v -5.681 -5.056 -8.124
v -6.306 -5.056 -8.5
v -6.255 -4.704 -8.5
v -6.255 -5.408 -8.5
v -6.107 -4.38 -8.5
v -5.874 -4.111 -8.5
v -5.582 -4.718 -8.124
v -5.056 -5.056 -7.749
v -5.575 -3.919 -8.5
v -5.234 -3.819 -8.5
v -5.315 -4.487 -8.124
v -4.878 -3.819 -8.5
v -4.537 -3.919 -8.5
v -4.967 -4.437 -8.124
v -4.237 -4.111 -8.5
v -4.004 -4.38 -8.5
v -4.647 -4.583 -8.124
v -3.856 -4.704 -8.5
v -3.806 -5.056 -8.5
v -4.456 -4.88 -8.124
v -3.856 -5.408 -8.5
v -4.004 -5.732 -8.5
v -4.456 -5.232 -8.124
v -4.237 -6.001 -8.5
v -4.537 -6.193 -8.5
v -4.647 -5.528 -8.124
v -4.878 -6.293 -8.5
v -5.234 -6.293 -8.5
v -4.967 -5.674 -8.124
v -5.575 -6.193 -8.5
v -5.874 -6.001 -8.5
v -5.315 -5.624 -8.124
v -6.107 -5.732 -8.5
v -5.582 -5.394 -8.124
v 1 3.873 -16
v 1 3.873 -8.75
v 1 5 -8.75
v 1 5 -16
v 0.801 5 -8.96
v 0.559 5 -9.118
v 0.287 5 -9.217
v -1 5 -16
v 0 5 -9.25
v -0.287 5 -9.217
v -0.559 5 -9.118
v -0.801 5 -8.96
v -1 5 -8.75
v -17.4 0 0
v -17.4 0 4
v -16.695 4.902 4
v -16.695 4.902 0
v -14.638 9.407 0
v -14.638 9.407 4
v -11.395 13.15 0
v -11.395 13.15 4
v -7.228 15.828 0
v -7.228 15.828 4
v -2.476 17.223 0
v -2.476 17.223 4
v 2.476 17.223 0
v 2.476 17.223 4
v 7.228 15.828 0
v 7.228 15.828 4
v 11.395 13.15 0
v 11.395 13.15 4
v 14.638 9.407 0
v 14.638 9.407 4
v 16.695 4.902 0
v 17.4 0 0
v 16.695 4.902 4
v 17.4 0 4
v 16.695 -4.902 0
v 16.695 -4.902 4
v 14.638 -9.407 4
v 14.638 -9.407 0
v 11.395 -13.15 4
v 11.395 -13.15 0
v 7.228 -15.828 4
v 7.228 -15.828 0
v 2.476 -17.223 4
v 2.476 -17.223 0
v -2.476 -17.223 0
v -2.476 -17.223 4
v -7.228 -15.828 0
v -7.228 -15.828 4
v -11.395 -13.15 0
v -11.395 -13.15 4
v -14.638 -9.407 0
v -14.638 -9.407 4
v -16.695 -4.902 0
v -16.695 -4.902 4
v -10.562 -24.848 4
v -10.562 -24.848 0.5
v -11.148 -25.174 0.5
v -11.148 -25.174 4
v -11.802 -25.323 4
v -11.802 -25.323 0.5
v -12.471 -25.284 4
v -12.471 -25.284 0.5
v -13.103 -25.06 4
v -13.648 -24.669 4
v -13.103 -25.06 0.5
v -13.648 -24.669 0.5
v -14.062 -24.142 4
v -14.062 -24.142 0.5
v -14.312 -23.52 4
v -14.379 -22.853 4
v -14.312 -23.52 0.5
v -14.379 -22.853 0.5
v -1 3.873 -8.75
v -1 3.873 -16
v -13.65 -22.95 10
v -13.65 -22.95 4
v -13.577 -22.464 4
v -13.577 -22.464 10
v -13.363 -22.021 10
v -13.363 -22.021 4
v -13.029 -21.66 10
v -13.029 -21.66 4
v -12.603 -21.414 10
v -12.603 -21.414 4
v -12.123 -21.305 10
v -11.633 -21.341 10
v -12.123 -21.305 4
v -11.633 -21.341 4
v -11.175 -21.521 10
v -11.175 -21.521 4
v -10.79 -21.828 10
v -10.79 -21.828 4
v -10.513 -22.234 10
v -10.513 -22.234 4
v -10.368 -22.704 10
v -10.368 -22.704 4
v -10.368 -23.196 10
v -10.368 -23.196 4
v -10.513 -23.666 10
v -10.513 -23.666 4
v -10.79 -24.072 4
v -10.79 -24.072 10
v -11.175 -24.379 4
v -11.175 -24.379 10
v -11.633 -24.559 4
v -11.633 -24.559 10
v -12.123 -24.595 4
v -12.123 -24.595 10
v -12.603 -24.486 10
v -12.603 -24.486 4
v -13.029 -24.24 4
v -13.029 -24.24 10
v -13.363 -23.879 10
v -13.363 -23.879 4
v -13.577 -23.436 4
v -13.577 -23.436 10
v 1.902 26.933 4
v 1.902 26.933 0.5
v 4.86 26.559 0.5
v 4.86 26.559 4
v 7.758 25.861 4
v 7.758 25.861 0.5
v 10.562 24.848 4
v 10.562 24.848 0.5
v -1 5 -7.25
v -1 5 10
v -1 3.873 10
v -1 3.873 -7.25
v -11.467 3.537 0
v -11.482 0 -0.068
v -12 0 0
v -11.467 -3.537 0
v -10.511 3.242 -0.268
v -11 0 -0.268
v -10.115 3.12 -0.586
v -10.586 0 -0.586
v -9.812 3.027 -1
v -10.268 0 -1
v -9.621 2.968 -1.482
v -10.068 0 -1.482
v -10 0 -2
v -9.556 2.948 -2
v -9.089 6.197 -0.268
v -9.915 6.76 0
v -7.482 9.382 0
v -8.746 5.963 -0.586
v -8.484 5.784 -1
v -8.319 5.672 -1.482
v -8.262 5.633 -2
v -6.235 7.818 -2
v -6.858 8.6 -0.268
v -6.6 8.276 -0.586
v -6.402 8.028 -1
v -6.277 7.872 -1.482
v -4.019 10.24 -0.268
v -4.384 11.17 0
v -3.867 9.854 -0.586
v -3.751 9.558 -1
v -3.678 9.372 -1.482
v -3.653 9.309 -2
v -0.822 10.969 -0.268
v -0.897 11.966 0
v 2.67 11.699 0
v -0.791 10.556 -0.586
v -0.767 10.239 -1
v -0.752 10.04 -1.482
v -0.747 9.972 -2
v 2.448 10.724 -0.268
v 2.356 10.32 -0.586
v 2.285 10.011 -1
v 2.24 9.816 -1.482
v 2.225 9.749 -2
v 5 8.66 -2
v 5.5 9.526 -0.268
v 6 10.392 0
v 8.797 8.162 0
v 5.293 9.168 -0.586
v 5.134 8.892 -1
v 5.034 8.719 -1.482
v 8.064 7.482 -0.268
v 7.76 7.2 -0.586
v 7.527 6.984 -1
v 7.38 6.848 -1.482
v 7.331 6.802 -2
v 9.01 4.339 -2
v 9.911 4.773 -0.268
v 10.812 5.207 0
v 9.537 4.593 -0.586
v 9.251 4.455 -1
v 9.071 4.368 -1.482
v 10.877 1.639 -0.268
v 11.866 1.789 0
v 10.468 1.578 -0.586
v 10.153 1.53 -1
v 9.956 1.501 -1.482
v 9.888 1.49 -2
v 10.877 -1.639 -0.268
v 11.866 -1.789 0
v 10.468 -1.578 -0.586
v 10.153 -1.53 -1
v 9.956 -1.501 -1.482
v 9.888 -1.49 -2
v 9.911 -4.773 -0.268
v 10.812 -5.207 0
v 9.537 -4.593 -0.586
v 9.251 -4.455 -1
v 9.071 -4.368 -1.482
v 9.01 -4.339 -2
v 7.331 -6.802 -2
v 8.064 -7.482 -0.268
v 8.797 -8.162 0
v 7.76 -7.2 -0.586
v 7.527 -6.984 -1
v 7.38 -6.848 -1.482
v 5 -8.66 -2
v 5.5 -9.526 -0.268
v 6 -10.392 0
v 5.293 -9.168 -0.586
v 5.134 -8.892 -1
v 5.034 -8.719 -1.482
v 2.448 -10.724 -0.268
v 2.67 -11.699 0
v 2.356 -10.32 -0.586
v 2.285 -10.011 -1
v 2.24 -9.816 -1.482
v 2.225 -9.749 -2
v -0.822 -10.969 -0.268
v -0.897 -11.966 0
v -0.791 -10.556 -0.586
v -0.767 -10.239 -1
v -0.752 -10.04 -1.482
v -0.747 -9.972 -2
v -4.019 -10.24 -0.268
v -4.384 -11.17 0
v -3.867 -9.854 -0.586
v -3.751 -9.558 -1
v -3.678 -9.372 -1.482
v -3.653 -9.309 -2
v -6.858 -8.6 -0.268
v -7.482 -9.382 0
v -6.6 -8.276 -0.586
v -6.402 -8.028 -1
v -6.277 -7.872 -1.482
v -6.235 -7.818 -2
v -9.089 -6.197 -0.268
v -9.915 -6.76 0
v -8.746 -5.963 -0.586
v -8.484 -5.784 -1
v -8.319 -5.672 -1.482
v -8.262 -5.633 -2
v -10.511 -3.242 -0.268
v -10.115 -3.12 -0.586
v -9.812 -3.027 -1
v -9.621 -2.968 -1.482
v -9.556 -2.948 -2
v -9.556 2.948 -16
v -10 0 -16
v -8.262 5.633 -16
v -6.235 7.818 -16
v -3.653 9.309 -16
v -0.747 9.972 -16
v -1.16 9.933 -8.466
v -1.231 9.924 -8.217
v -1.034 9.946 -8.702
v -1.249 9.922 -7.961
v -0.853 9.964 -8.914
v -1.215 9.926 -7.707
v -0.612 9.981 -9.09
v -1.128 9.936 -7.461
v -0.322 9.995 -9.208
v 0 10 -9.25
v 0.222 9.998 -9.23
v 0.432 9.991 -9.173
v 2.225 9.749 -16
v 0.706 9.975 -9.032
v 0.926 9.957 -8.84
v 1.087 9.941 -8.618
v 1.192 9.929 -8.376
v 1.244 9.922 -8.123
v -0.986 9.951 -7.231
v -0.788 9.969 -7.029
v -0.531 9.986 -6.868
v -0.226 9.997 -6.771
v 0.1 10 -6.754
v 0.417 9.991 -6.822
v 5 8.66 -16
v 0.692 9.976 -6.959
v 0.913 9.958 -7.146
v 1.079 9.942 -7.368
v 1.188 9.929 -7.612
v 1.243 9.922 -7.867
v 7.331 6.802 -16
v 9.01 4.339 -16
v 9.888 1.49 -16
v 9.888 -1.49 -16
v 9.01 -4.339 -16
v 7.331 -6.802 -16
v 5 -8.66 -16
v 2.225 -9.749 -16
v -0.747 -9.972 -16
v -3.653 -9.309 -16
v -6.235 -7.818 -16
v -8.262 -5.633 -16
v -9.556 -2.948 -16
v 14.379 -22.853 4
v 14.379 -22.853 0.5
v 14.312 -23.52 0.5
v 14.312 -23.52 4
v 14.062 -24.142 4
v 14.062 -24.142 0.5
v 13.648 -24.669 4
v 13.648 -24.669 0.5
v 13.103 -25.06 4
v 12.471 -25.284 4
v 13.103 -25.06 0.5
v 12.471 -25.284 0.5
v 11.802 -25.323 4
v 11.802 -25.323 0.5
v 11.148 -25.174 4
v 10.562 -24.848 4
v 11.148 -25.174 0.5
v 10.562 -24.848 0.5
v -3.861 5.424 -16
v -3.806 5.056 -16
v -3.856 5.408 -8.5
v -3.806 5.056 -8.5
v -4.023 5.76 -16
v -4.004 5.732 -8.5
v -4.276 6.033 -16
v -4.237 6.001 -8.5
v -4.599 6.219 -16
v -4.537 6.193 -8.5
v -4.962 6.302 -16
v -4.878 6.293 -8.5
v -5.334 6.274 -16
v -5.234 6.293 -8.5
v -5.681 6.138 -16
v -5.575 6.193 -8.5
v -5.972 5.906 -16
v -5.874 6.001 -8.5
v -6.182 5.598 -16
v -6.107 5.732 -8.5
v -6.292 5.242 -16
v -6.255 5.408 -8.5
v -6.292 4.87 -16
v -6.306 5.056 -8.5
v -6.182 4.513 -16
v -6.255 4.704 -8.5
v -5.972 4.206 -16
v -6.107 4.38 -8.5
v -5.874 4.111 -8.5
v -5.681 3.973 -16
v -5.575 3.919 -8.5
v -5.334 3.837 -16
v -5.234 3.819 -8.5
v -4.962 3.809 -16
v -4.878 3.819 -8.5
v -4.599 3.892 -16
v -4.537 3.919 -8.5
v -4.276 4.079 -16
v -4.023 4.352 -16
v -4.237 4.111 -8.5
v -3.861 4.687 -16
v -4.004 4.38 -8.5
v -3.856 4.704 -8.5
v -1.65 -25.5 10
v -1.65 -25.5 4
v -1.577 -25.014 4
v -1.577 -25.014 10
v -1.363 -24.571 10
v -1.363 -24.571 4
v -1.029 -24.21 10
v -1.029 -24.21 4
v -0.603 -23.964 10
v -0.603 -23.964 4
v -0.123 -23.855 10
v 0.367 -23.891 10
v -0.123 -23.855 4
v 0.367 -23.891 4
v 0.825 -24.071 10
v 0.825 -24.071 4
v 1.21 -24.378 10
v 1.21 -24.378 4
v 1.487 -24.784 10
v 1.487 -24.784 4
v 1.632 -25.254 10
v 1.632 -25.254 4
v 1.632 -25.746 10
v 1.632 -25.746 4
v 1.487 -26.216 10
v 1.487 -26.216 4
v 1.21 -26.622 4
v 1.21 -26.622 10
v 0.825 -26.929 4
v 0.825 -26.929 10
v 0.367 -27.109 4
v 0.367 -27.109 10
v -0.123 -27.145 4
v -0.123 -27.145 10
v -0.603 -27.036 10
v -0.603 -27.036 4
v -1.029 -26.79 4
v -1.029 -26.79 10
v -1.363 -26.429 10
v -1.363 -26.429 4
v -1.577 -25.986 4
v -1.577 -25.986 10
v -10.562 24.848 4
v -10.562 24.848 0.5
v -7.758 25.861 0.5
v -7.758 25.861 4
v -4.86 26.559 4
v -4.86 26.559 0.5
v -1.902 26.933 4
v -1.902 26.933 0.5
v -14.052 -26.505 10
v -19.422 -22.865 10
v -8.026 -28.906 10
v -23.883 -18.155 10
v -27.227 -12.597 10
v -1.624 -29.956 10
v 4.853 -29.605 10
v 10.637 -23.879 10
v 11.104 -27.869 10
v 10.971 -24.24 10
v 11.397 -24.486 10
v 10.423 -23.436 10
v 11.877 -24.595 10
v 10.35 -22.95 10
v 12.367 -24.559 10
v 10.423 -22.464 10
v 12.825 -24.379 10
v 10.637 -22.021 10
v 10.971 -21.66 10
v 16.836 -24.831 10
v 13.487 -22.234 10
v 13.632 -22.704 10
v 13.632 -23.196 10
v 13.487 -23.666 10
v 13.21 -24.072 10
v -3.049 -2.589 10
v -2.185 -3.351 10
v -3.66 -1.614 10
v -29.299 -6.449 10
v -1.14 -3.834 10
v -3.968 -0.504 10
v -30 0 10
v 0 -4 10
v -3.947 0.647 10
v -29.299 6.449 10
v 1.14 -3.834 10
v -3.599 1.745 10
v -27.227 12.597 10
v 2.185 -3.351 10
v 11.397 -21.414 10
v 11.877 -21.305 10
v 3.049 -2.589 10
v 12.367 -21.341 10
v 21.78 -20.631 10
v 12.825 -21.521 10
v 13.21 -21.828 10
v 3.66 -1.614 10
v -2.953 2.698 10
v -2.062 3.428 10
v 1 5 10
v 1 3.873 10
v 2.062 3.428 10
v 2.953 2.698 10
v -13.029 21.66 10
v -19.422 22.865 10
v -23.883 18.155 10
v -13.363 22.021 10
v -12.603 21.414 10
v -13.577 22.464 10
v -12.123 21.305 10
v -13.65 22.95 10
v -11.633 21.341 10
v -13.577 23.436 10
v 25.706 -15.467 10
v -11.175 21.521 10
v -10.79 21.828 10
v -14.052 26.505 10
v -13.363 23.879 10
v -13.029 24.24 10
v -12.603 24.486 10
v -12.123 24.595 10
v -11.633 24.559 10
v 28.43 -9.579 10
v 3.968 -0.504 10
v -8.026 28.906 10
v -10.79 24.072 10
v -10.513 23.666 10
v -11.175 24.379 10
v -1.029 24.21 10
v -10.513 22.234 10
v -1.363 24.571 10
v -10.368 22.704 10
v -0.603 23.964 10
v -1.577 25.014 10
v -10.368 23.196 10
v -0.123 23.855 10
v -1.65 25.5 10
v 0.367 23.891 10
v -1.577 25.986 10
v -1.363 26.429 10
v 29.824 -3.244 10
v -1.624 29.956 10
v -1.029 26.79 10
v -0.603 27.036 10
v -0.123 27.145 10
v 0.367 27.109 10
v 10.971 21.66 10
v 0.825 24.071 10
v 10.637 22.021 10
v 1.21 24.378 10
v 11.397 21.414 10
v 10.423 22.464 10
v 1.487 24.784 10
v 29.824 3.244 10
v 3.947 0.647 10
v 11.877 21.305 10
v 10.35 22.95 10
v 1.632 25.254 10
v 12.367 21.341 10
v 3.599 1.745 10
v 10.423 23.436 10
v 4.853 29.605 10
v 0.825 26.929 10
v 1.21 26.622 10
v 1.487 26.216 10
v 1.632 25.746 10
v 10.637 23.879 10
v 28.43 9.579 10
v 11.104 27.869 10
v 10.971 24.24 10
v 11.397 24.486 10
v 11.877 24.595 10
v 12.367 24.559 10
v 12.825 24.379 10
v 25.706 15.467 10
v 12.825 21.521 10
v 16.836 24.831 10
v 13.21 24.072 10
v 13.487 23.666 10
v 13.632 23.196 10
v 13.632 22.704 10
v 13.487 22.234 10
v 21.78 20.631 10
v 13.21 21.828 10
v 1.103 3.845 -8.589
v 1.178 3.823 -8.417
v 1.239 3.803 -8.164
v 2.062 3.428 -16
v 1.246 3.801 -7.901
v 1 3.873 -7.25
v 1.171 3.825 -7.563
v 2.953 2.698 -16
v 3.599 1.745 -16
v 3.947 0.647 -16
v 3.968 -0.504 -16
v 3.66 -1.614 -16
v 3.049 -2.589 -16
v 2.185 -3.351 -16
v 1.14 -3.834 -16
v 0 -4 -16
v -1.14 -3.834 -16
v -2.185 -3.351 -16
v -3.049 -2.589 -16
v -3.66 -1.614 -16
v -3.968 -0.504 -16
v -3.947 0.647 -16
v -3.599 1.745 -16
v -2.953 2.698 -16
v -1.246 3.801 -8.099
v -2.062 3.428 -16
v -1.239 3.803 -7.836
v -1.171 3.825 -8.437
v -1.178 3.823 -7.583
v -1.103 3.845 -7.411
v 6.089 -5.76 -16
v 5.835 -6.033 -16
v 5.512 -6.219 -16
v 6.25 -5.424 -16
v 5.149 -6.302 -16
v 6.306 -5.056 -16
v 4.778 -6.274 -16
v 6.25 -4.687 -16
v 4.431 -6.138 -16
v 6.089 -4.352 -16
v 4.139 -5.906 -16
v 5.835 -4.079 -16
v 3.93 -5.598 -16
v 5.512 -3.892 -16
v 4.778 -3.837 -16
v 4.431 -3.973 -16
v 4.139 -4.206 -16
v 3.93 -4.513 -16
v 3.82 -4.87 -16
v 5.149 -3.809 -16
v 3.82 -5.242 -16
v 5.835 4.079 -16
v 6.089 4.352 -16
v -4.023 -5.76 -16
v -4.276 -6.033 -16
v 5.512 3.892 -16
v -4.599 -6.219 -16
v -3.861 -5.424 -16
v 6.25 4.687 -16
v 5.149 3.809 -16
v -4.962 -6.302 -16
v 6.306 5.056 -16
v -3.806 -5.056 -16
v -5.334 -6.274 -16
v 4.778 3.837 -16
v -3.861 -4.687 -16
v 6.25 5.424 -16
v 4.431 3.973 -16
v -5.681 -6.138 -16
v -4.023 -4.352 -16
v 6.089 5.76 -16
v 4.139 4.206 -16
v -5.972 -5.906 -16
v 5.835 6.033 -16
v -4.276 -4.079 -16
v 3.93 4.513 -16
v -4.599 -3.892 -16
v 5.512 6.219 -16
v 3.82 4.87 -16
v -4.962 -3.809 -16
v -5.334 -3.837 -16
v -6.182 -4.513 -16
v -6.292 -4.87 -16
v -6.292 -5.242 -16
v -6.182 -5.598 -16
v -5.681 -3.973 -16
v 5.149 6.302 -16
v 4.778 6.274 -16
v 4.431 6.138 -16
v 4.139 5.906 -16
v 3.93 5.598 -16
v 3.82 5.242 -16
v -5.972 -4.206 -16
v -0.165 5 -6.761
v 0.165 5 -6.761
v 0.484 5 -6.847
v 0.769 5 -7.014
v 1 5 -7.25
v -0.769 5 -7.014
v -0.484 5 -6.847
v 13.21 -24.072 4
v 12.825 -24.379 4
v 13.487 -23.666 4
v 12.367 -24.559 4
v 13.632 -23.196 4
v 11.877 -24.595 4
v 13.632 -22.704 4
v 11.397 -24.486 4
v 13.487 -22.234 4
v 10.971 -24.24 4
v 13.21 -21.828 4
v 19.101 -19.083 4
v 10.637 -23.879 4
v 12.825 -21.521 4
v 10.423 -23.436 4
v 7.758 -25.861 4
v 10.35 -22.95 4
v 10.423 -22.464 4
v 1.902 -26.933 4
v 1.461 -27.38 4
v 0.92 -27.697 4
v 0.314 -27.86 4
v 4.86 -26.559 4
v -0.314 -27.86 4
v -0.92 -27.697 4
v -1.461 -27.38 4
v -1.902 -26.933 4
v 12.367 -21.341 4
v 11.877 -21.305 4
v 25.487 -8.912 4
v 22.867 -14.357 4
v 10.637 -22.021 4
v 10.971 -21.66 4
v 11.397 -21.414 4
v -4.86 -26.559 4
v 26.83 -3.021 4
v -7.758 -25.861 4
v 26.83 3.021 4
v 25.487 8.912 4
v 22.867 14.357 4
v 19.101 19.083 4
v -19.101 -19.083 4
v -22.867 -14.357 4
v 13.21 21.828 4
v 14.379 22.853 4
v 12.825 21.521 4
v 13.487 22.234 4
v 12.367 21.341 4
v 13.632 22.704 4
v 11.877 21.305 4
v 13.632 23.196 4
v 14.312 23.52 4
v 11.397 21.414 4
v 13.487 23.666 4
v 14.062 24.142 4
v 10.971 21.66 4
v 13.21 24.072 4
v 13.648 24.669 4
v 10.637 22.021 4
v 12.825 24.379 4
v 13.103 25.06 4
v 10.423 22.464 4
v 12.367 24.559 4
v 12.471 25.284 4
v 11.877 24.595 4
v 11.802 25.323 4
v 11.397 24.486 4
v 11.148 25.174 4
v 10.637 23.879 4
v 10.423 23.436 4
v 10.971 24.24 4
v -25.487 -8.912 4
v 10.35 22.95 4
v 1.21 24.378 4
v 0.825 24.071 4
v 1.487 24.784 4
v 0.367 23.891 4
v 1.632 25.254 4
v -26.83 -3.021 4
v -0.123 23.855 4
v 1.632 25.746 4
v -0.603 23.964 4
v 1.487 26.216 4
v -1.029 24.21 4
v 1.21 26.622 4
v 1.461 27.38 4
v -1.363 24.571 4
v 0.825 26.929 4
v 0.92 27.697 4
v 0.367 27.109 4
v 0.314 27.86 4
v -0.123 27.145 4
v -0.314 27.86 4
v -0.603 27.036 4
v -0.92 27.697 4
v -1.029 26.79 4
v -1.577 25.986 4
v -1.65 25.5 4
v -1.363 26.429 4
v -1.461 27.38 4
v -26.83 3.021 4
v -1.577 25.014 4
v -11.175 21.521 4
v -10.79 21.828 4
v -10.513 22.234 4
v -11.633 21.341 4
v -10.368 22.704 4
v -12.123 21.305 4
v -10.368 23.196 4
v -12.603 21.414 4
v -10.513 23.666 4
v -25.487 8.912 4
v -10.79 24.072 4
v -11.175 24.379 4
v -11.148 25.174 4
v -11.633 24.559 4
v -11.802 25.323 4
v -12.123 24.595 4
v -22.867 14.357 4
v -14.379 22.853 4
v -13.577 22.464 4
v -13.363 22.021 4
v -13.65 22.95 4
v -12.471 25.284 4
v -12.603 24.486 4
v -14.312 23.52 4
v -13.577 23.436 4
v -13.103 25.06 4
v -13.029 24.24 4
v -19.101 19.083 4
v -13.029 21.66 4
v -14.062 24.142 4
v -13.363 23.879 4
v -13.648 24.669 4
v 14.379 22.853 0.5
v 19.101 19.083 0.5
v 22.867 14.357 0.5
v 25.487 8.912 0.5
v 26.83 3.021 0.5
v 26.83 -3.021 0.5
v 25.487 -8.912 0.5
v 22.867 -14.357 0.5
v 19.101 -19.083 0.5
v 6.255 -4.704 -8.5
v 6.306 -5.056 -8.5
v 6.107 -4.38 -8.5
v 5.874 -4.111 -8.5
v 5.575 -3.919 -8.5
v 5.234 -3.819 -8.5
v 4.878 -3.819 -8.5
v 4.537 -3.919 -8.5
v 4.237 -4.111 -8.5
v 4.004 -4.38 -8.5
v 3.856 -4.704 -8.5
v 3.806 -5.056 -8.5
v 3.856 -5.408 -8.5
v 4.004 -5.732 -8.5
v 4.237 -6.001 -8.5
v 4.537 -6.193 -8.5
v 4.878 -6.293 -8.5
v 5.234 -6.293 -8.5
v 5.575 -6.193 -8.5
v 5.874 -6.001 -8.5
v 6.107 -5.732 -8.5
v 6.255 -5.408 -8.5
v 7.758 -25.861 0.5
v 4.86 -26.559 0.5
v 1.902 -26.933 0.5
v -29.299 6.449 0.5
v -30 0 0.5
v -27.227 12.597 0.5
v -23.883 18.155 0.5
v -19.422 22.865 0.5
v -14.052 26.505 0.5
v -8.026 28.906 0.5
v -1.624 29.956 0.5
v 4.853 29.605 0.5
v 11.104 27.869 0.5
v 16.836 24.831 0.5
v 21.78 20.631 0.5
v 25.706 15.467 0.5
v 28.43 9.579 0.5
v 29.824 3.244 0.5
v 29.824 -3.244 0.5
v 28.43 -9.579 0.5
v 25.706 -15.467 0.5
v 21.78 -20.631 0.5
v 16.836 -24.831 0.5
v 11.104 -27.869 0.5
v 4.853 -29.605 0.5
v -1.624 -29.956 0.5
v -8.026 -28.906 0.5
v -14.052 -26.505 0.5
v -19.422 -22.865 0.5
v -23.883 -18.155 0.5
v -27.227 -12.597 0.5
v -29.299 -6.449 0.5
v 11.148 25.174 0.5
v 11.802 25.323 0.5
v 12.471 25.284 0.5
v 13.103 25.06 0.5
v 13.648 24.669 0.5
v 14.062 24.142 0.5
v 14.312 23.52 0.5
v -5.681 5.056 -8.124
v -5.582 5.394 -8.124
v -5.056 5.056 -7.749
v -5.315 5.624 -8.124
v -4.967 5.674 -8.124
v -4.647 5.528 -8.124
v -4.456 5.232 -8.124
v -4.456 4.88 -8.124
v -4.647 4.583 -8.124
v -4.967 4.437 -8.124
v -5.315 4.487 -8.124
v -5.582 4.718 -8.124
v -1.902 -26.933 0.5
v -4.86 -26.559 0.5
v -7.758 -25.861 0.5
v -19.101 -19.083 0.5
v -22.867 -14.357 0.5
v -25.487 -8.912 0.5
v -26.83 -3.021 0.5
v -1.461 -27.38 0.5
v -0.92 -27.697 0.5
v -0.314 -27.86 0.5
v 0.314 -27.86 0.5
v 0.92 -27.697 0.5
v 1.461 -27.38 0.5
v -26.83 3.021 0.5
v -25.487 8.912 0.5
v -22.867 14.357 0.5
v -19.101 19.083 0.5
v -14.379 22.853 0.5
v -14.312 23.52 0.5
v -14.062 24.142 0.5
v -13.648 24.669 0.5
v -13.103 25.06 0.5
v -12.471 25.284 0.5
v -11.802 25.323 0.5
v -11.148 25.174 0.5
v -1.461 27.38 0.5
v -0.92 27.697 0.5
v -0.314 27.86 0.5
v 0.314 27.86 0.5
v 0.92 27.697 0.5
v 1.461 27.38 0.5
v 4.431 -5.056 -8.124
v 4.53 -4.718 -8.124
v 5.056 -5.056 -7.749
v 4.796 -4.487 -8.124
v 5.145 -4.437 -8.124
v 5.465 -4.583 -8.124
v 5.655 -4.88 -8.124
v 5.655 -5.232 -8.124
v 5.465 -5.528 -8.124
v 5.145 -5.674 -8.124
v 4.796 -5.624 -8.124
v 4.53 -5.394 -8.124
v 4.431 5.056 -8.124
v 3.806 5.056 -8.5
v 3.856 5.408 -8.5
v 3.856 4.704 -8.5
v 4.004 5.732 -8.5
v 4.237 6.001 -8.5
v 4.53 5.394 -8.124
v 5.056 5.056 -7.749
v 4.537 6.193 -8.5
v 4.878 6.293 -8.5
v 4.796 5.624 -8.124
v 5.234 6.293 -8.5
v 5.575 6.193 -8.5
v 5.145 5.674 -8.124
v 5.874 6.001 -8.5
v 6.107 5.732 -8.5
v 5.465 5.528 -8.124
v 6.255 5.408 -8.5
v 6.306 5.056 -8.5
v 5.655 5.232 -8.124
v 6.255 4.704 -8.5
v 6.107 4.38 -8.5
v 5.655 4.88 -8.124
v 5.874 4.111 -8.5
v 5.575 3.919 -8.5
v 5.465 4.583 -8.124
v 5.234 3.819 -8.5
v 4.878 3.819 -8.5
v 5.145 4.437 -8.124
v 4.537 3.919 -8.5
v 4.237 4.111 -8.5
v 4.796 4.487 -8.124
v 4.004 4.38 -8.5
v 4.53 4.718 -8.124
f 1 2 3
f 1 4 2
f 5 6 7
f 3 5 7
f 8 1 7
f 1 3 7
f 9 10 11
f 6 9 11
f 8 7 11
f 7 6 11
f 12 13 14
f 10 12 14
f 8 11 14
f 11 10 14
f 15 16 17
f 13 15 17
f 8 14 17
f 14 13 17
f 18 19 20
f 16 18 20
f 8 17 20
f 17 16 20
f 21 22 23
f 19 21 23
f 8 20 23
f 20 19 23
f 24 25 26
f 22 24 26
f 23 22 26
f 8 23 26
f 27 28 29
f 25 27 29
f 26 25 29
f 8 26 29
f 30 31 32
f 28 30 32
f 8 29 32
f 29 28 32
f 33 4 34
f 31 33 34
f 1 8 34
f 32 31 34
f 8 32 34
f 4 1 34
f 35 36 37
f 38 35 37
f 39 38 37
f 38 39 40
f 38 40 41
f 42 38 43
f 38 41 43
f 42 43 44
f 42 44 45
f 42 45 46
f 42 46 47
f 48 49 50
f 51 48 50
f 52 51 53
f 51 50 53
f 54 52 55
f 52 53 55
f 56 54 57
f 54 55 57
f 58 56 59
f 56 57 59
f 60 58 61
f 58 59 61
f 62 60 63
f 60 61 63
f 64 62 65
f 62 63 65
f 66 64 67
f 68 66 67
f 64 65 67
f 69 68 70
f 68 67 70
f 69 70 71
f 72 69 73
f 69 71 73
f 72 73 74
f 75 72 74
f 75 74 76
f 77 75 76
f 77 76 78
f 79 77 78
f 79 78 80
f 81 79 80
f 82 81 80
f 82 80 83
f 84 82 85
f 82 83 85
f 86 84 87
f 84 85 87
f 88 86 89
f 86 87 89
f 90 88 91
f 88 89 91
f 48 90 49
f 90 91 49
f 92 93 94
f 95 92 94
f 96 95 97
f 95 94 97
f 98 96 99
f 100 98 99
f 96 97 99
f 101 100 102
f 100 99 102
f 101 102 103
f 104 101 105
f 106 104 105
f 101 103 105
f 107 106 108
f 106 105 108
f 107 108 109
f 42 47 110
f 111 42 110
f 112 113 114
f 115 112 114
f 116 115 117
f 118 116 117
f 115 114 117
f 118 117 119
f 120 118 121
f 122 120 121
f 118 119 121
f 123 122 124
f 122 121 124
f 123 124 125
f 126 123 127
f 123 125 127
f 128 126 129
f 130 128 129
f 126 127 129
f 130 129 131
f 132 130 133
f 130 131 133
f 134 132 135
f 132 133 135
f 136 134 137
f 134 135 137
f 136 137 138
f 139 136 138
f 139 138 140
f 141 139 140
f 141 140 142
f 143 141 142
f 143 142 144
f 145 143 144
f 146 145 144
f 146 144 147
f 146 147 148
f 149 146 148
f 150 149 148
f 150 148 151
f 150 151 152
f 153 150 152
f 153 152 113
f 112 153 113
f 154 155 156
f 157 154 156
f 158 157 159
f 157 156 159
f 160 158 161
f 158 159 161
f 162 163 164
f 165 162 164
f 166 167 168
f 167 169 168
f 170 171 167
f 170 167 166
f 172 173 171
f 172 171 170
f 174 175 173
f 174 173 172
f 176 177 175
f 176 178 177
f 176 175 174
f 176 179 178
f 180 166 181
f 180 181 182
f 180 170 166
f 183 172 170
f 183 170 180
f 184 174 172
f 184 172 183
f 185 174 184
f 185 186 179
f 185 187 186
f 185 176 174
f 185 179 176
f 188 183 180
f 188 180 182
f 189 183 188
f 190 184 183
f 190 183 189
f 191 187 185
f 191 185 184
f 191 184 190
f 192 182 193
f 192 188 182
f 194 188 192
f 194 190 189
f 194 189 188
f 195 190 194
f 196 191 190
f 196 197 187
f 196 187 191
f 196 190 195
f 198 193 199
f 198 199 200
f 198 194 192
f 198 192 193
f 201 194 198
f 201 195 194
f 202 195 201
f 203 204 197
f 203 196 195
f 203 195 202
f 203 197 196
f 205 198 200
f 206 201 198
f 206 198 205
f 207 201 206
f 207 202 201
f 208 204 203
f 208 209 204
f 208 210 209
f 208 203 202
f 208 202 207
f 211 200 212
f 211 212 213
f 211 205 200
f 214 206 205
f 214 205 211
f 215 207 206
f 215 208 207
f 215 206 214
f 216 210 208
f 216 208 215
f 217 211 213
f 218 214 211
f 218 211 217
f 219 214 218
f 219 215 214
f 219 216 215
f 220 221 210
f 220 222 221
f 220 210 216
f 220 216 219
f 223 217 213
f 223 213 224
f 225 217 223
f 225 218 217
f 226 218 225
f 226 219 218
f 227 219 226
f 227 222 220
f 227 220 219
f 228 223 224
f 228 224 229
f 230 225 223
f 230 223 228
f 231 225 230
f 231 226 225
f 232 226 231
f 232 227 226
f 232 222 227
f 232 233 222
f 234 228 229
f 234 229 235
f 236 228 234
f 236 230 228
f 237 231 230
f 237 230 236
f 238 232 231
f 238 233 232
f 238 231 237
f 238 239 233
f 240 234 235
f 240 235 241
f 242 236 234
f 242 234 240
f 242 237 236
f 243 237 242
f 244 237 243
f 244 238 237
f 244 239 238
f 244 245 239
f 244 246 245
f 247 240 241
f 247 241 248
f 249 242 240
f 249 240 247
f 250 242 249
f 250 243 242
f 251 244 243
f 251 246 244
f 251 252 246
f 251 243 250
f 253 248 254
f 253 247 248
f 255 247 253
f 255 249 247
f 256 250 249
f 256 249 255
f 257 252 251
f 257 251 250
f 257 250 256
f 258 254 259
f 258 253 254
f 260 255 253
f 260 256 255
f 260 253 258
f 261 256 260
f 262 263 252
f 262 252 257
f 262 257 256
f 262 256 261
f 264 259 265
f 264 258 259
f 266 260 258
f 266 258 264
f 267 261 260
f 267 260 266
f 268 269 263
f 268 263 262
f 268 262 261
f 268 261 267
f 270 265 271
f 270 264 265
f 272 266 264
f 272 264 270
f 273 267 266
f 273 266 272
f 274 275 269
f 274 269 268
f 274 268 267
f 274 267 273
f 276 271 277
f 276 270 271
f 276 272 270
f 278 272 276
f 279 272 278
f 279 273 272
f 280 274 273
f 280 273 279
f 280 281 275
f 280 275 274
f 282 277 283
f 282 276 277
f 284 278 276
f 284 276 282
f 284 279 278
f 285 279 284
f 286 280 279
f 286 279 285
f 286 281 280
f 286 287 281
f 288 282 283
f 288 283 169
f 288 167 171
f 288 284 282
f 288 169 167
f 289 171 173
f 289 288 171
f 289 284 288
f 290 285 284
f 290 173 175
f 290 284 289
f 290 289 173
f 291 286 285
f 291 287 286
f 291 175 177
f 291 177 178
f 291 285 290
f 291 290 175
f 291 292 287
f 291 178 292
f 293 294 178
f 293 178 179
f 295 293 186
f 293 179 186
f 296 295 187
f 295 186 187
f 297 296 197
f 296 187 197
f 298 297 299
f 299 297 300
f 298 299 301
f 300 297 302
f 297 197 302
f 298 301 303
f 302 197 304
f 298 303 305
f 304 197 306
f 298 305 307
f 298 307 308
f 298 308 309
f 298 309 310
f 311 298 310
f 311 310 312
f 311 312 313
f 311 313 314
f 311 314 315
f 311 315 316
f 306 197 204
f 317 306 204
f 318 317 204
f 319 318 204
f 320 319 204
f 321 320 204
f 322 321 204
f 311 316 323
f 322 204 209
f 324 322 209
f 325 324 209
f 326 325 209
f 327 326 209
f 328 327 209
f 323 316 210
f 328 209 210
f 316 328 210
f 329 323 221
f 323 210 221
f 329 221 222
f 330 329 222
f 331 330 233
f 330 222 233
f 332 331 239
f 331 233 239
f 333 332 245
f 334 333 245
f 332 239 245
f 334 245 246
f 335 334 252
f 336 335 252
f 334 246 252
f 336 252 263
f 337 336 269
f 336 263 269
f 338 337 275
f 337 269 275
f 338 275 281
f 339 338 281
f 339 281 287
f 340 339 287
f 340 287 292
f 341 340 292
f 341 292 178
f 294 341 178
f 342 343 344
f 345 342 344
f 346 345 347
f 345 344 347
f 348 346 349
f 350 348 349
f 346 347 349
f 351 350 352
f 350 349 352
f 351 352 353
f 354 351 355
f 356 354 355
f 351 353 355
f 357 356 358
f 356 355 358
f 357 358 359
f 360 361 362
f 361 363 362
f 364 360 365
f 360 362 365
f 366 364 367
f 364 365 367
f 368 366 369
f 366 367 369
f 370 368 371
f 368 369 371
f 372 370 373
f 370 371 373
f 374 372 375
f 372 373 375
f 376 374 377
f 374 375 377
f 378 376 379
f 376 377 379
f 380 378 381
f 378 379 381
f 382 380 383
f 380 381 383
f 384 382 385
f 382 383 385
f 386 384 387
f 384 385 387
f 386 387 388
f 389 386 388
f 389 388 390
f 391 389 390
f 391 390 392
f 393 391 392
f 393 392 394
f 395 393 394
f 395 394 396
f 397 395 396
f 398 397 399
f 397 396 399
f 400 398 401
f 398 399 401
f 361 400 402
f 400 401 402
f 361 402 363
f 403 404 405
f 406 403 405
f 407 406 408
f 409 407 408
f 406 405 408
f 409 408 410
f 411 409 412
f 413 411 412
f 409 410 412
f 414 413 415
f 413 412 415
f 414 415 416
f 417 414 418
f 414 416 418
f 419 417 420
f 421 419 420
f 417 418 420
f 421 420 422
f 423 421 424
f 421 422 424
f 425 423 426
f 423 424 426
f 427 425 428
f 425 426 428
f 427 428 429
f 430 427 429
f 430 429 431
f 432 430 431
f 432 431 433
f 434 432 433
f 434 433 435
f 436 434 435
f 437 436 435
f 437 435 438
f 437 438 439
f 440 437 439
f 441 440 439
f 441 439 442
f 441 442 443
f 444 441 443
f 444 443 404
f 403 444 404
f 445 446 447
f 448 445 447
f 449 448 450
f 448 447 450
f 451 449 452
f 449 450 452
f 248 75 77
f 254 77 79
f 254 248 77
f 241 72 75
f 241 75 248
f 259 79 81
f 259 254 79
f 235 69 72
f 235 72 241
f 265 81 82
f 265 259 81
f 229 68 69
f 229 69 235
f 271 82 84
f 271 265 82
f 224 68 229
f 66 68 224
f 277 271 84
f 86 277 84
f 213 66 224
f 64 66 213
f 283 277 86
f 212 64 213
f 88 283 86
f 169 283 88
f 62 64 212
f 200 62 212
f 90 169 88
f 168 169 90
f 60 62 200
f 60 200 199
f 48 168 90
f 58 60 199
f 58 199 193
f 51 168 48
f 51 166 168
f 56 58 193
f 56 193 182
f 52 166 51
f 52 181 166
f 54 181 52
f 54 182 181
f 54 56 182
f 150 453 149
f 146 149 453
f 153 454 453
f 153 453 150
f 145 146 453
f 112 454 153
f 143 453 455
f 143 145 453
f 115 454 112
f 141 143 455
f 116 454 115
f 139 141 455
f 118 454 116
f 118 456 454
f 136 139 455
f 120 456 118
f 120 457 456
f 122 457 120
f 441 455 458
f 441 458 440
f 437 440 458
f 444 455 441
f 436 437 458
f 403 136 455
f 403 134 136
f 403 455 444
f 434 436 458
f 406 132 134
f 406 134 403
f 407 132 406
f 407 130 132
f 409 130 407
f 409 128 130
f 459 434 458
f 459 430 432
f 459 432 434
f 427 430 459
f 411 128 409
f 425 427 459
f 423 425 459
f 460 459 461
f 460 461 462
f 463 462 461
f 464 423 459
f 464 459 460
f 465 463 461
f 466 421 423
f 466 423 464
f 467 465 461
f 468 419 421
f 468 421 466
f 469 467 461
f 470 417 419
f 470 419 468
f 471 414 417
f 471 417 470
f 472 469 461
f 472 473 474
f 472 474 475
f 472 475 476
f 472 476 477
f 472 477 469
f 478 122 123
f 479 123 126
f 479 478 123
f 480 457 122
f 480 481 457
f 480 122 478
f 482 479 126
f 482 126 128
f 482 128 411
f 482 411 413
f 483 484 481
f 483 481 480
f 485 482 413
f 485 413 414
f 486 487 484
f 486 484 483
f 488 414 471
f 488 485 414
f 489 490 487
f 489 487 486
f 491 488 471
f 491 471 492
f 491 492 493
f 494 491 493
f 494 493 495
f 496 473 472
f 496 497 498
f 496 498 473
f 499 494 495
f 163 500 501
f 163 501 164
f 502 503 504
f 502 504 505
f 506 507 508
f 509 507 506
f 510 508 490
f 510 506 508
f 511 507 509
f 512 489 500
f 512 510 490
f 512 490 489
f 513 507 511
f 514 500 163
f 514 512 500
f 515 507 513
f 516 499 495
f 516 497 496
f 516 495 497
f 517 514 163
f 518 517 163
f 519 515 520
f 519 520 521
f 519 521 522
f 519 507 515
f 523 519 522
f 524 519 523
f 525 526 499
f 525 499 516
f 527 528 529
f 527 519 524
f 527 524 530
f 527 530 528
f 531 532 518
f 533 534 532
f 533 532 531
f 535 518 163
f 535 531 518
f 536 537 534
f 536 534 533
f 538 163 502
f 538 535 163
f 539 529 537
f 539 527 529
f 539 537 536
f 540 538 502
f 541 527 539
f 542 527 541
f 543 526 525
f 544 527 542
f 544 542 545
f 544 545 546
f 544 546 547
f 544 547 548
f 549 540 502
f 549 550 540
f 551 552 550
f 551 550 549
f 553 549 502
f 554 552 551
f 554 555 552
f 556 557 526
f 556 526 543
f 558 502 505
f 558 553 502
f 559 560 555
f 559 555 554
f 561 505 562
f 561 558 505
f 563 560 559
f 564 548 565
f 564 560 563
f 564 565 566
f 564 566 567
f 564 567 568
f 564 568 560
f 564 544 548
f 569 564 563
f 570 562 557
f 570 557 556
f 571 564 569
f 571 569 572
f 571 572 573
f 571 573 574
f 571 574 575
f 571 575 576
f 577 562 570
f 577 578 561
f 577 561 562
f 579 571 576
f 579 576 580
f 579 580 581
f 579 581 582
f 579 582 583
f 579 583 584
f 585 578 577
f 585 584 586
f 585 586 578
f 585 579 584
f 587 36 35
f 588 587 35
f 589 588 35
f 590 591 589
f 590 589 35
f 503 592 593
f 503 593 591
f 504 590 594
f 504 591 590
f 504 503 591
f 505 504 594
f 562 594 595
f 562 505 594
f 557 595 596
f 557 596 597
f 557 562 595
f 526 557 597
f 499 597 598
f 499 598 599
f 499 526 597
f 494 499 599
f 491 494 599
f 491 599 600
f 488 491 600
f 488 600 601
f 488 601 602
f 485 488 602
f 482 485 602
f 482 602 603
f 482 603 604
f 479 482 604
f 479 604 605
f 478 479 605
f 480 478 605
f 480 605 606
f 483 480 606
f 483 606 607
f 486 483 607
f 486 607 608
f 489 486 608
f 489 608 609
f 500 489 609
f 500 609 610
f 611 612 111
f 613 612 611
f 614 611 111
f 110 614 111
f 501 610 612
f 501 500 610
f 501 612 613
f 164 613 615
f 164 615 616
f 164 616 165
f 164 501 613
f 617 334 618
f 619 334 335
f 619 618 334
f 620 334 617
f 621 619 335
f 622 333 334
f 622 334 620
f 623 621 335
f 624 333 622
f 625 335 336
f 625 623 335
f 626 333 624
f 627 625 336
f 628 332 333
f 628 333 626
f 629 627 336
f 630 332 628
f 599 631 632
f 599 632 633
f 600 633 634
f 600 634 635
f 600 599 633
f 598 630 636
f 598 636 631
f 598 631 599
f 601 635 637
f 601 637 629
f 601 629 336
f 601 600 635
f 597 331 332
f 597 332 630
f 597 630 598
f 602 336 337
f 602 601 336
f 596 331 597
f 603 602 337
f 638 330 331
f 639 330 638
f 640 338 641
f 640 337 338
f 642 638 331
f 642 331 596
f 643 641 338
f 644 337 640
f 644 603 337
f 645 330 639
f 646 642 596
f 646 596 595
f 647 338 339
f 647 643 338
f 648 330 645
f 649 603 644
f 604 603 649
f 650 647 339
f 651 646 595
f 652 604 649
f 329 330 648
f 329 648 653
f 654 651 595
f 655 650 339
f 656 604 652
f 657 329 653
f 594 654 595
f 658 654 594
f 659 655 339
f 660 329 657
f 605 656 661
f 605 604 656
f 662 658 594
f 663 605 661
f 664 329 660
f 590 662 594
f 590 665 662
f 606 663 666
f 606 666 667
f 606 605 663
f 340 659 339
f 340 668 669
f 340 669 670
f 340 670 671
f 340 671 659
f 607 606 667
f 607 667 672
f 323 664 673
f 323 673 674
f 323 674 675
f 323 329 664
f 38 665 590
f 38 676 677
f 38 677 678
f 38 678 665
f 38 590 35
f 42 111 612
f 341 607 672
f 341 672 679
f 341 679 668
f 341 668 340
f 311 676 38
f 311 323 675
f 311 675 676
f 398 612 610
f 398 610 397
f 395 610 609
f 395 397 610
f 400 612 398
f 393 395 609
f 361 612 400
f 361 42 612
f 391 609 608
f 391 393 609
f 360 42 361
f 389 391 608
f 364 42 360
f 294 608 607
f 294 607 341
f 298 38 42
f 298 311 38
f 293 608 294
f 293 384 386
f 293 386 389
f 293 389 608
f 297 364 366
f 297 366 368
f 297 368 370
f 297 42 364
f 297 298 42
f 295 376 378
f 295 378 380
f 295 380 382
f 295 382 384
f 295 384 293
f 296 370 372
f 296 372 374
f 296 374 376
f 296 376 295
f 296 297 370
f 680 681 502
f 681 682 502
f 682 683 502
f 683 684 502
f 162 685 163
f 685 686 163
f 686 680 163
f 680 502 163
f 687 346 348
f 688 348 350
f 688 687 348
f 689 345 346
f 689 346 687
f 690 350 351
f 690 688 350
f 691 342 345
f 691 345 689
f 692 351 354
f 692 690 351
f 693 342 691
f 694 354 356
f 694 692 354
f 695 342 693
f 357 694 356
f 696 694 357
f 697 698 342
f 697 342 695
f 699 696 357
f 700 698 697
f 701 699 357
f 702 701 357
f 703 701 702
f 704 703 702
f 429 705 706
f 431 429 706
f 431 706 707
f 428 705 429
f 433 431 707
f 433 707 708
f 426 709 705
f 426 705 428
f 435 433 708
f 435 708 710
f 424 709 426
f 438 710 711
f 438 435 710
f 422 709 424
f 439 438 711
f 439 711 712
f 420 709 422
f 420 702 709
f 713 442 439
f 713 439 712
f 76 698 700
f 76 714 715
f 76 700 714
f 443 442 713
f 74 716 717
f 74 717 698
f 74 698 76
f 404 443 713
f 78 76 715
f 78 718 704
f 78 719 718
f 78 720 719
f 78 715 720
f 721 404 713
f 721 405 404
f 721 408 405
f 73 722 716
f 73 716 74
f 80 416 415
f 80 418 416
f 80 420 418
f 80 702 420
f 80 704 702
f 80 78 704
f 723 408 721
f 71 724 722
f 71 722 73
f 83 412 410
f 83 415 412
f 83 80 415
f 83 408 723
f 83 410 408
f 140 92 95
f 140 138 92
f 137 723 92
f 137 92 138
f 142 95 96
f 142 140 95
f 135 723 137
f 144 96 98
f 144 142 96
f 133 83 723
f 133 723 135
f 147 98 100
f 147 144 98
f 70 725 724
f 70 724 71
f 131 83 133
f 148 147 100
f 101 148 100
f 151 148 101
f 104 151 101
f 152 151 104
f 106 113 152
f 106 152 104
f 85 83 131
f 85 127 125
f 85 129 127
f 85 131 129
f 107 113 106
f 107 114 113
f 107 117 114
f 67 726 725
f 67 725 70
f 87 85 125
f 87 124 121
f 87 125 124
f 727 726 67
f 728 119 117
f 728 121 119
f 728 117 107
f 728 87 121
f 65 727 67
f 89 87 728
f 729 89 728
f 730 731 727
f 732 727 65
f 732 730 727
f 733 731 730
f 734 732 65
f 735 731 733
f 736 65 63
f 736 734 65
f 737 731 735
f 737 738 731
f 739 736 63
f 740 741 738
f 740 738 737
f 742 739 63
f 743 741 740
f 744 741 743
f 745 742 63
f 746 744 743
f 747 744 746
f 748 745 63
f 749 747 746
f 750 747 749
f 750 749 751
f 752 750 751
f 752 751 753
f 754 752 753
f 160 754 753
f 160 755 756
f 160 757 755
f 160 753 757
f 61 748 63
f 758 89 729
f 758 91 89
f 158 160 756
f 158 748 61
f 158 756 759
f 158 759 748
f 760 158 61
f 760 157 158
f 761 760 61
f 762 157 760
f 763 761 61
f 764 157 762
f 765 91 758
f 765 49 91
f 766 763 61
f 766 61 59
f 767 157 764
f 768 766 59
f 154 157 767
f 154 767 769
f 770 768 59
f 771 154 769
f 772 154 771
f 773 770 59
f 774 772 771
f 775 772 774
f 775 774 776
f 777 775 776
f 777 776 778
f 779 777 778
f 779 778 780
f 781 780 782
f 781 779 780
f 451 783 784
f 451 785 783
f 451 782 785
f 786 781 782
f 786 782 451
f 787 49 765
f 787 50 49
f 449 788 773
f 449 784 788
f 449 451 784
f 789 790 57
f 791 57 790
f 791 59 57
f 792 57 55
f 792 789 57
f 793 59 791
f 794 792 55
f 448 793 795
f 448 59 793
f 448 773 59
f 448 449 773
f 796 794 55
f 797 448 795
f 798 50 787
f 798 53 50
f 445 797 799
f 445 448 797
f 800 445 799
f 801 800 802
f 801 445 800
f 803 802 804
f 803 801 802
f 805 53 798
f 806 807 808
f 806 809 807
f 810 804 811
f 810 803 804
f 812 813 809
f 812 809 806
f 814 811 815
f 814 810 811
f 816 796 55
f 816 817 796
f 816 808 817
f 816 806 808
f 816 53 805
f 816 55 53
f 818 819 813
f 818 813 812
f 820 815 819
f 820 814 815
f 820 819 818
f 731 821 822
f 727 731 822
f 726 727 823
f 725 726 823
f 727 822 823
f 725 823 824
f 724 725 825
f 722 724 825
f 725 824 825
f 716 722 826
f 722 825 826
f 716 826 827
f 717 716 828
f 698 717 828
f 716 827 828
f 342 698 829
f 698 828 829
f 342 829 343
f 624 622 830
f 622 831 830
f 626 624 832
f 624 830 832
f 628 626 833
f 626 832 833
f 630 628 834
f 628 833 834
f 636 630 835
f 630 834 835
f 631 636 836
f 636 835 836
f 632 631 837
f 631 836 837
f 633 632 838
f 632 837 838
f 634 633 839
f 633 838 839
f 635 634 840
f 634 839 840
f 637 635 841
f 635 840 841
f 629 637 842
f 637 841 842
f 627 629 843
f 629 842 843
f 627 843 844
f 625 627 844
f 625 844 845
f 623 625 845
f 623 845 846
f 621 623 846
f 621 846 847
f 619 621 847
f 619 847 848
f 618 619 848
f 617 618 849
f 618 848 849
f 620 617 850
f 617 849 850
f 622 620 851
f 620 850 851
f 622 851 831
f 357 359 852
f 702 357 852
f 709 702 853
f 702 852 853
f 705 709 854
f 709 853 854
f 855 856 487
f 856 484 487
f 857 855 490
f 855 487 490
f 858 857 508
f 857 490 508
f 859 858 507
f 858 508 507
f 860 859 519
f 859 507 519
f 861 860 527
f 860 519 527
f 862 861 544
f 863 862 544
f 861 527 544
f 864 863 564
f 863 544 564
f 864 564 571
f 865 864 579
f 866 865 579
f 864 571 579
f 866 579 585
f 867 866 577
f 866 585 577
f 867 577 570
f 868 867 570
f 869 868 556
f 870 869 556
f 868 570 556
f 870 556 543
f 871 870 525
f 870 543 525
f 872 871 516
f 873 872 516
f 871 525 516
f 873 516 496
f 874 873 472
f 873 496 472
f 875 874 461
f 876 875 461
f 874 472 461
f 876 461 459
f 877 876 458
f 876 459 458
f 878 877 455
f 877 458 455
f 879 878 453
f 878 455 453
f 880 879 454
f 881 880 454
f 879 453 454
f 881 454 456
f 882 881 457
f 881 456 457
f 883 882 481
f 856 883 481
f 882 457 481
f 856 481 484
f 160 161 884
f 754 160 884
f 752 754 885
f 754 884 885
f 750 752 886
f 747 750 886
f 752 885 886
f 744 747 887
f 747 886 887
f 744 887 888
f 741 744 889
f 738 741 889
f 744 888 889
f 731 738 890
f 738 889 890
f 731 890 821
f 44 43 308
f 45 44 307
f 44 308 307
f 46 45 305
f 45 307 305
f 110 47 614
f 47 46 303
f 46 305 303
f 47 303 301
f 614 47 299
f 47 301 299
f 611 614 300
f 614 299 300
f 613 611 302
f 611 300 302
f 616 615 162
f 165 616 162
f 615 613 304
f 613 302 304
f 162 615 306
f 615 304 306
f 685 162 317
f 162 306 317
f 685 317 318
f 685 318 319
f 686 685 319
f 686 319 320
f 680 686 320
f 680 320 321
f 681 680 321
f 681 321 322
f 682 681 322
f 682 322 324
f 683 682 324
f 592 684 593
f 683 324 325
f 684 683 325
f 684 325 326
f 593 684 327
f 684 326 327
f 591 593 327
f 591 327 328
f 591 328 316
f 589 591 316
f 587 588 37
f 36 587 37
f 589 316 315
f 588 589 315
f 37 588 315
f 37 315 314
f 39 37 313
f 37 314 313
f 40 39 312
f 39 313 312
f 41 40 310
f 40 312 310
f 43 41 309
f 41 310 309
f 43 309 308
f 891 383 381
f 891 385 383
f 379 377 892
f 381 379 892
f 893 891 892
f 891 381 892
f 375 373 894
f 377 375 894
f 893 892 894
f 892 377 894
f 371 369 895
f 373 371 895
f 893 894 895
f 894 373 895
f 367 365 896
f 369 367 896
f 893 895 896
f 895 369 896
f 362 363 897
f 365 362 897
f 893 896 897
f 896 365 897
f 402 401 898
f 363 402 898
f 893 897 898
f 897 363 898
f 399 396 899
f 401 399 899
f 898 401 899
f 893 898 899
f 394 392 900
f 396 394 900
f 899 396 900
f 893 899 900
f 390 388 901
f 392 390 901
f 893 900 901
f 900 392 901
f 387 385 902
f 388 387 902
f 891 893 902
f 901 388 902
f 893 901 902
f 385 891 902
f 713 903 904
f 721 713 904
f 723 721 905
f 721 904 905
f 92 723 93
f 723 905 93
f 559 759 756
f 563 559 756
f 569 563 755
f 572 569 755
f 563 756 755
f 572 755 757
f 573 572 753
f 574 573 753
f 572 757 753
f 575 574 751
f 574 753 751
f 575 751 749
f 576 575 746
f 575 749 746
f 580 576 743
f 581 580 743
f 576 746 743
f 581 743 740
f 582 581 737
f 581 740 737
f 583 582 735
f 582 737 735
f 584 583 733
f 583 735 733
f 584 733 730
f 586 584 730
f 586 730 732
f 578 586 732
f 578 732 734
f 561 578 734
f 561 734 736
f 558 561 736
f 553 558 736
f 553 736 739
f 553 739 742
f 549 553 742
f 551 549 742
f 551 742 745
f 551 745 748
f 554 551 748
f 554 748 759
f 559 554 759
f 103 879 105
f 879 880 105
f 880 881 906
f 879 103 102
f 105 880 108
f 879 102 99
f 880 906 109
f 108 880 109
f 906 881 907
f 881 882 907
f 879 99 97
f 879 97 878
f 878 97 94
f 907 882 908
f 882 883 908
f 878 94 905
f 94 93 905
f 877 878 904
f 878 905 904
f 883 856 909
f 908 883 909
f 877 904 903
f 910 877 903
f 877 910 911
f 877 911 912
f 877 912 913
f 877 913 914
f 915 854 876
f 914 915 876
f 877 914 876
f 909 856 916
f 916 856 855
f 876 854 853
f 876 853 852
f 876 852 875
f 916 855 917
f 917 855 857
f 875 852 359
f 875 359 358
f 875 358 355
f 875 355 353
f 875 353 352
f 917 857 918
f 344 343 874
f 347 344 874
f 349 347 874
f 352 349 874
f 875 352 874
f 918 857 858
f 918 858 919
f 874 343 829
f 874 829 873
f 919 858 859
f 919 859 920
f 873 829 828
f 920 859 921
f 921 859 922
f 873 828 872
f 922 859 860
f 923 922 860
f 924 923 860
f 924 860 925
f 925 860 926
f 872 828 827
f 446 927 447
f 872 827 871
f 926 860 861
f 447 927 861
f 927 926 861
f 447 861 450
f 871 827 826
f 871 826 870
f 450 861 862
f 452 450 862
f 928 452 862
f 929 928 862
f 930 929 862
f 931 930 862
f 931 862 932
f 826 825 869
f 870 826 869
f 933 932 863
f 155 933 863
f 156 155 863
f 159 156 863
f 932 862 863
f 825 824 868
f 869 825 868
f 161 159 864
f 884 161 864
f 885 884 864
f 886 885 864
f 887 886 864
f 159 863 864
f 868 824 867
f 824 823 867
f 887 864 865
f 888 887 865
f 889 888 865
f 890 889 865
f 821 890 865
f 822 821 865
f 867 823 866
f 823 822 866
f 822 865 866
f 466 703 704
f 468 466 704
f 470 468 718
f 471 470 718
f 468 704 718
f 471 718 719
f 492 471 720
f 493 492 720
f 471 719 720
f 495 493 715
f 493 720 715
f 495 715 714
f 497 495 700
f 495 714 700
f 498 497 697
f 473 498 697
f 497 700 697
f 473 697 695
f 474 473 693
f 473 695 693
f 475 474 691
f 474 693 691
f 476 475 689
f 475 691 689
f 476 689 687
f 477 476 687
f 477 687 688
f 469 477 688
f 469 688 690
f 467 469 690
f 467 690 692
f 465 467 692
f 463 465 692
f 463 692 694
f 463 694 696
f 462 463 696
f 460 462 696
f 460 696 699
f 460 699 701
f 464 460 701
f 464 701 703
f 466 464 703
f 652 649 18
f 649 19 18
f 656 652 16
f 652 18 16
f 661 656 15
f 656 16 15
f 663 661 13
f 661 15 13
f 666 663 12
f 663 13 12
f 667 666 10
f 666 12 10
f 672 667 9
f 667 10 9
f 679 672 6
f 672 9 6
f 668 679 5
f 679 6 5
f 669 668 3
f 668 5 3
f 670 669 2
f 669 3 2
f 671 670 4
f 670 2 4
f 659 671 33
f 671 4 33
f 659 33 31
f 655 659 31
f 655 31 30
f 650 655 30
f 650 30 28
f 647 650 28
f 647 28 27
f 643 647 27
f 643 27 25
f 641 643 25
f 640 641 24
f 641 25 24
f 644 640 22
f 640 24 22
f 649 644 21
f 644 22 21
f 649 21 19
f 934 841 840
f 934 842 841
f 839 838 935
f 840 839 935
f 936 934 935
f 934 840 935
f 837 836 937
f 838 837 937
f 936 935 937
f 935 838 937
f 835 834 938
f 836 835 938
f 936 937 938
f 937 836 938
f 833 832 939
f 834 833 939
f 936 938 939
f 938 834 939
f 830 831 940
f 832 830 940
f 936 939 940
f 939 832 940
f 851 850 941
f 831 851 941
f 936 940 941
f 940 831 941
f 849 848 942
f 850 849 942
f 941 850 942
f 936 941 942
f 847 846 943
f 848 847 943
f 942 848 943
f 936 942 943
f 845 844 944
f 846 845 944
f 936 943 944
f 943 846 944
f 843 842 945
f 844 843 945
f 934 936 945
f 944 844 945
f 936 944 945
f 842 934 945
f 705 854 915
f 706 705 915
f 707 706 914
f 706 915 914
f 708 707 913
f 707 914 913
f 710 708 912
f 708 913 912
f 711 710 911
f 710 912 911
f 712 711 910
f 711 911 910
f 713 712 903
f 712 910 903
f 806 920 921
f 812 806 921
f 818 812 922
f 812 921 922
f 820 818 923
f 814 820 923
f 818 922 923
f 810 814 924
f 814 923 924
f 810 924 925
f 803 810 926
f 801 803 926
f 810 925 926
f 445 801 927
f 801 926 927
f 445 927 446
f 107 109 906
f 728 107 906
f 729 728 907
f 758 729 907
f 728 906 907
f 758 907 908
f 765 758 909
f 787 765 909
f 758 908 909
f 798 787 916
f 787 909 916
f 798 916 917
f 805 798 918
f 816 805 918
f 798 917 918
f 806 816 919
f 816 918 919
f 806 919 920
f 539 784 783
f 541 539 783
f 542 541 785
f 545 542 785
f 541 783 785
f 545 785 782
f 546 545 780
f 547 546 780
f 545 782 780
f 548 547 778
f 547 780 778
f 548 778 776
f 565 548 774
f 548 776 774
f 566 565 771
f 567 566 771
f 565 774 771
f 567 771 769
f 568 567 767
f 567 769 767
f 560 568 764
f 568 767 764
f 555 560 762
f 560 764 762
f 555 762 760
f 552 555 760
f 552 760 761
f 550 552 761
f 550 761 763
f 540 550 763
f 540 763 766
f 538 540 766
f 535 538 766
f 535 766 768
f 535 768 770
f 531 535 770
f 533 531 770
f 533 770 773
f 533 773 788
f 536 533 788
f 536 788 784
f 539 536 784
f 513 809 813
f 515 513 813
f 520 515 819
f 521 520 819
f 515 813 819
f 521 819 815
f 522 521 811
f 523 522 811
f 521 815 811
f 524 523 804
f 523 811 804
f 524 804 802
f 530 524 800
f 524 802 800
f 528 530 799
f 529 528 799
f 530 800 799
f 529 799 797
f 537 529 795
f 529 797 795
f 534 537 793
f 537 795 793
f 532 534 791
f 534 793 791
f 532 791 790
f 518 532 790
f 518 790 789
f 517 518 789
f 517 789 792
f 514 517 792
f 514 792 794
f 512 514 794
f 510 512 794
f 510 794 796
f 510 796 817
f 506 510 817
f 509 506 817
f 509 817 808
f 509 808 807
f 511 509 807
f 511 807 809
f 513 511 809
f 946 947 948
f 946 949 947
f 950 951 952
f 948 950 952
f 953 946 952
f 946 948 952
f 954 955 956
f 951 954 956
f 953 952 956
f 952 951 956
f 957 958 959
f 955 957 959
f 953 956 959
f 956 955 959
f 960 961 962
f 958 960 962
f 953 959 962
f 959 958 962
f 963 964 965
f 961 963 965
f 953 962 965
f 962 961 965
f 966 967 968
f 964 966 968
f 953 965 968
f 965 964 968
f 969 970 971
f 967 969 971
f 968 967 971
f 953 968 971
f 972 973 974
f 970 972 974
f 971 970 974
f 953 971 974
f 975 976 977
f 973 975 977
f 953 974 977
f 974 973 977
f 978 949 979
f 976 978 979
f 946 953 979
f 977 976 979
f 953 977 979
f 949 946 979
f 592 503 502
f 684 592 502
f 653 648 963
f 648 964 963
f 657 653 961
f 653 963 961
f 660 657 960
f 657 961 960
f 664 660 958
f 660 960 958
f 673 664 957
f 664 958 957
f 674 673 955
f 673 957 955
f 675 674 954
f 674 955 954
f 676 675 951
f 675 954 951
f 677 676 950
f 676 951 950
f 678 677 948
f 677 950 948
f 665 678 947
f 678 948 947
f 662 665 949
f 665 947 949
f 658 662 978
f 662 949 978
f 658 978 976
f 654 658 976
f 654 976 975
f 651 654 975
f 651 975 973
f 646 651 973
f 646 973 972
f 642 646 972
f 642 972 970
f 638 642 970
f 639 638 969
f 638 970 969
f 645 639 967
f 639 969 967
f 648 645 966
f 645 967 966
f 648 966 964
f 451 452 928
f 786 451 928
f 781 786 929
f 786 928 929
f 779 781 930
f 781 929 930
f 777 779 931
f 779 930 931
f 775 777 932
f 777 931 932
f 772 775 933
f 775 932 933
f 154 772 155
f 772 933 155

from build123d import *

# Parameters (mm, degrees)
SKETCH1_W                 = 30
SKETCH1_H                 = 9.5
CUT_EXTRUDE1_DEPTH        = 3.5
SKETCH3_R                 = 17.4
BOSS_EXTRUDE1_DEPTH       = 4
SKETCH4_R                 = 10
BOSS_EXTRUDE2_DEPTH       = 16
CUT_EXTRUDE2_DEPTH        = 50.759421218
SKETCH6_W                 = 4
SKETCH6_H                 = 26
M4X0_7_TAPPED_HOLE1_D     = 3.3
M3X0_5_TAPPED_HOLE1_D     = 2.5
M3X0_5_TAPPED_HOLE1_DEPTH = 7.5
M3X0_5_TAPPED_HOLE1_TIP   = 0.751075774
FILLET1_R                 = 2
SKETCH15_W                = 1.25
SKETCH15_H                = 30


with BuildPart() as part:
    # Sketch1 → Revolve1 (revolve)
    with BuildSketch(Plane.XZ, mode=Mode.PRIVATE) as revolve1_sk:
        with Locations((15, 5.25)):
            Rectangle(SKETCH1_W, SKETCH1_H)
    revolve(revolve1_sk.sketch.rotate(Axis((0, 0, 10), (0, 0, -1)), 180), axis=Axis((0, 0, 10), (0, 0, -1)))

    # Sketch2 → Cut-Extrude1 (cut)
    with BuildSketch(Plane(origin=(0, 0, 0.5), x_dir=(-1, 0, 0), z_dir=(0, 0, -1))):
        with BuildLine():
            ThreePointArc((-14.379253383, 22.852506912), (-27, 0), (-14.379253383, -22.852506912))
            ThreePointArc((-14.379253383, -22.852506912), (-13.103370267, -25.060195635), (-10.562335147, -24.848281153))
            ThreePointArc((-10.562335147, -24.848281153), (-6.318658968, -26.250229501), (-1.901854596, -26.932934283))
            ThreePointArc((-1.901854596, -26.932934283), (0, -27.88125), (1.901854596, -26.932934283))
            ThreePointArc((1.901854596, -26.932934283), (6.318658968, -26.250229501), (10.562335147, -24.848281153))
            ThreePointArc((10.562335147, -24.848281153), (13.103370267, -25.060195635), (14.379253383, -22.852506912))
            ThreePointArc((14.379253383, -22.852506912), (27, 0), (14.379253383, 22.852506912))
            ThreePointArc((14.379253383, 22.852506912), (13.103370267, 25.060195635), (10.562335147, 24.848281153))
            ThreePointArc((10.562335147, 24.848281153), (6.318658968, 26.250229501), (1.901854596, 26.932934283))
            ThreePointArc((1.901854596, 26.932934283), (0, 27.88125), (-1.901854596, 26.932934283))
            ThreePointArc((-1.901854596, 26.932934283), (-6.318658968, 26.250229501), (-10.562335147, 24.848281153))
            ThreePointArc((-10.562335147, 24.848281153), (-13.103370267, 25.060195635), (-14.379253383, 22.852506912))
        make_face()
    extrude(amount=-CUT_EXTRUDE1_DEPTH, mode=Mode.SUBTRACT)

    # Sketch3 → Boss-Extrude1 (add)
    with BuildSketch(Plane(origin=(0, 0, 4), x_dir=(-1, 0, 0), z_dir=(0, 0, -1))):
        Circle(SKETCH3_R)
    extrude(amount=BOSS_EXTRUDE1_DEPTH)

    # Sketch4 → Boss-Extrude2 (add)
    with BuildSketch(Plane(origin=(0, 0, 0), x_dir=(-1, 0, 0), z_dir=(0, 0, -1))):
        Circle(SKETCH4_R)
    extrude(amount=BOSS_EXTRUDE2_DEPTH)

    # Sketch5 → Cut-Extrude2 (cut, through all)
    with BuildSketch(Plane.XY.offset(10)):
        with BuildLine():
            Line((-1, 5), (-1, 3.872983346))
            ThreePointArc((-1, 3.872983346), (0, 4), (1, 3.872983346))
            Line((1, 3.872983346), (1, 5))
            Line((1, 5), (-1, 5))
        make_face()
    extrude(amount=-CUT_EXTRUDE2_DEPTH, mode=Mode.SUBTRACT)

    # Sketch6 → Cut-Revolve1 (revolve, cut)
    with BuildSketch(Plane.XZ):
        with Locations((2, -3)):
            Rectangle(SKETCH6_W, SKETCH6_H)
    revolve(axis=Axis((0, 0, 10), (0, 0, -1)), mode=Mode.SUBTRACT)

    # M4x0.7 Tapped Hole1 (through all)
    with Locations(Plane.XY.offset(10)):
        with Locations((-12, -22.95), (0, -25.5), (12, -22.95), (12, 22.95), (0, 25.5), (-12, 22.95)):
            Hole(M4X0_7_TAPPED_HOLE1_D / 2)

    # M3x0.5 Tapped Hole1
    with Locations(Plane(origin=(0, 0, -16), x_dir=(-1, 0, 0), z_dir=(0, 0, -1))):
        with Locations((-5.055813485, -5.055813485), (5.055813485, -5.055813485), (5.055813485, 5.055813485), (-5.055813485, 5.055813485)):
            Hole(M3X0_5_TAPPED_HOLE1_D / 2, depth=M3X0_5_TAPPED_HOLE1_DEPTH)
            with Locations((0, 0, -(M3X0_5_TAPPED_HOLE1_DEPTH + M3X0_5_TAPPED_HOLE1_TIP / 2))):  # 118° drill point
                Cone(0, M3X0_5_TAPPED_HOLE1_D / 2, M3X0_5_TAPPED_HOLE1_TIP, mode=Mode.SUBTRACT)

    # Fillet1
    fillet1_edges = [part.edges().sort_by_distance(p)[0] for p in [
        (10, 0, 0),
    ]]
    fillet(fillet1_edges, radius=FILLET1_R)

    # Sketch15 → M3x0.5 Tapped Hole2 (revolve, cut)
    with BuildSketch(Plane(origin=(0, 0, -8), x_dir=(0, 0, -1), z_dir=(1, 0, 0))):
        with Locations((0.625, 15)):
            Rectangle(SKETCH15_W, SKETCH15_H)
    revolve(axis=Axis((0, -6.35, -8), (0, 1, 0)), mode=Mode.SUBTRACT)


solid = part.part
